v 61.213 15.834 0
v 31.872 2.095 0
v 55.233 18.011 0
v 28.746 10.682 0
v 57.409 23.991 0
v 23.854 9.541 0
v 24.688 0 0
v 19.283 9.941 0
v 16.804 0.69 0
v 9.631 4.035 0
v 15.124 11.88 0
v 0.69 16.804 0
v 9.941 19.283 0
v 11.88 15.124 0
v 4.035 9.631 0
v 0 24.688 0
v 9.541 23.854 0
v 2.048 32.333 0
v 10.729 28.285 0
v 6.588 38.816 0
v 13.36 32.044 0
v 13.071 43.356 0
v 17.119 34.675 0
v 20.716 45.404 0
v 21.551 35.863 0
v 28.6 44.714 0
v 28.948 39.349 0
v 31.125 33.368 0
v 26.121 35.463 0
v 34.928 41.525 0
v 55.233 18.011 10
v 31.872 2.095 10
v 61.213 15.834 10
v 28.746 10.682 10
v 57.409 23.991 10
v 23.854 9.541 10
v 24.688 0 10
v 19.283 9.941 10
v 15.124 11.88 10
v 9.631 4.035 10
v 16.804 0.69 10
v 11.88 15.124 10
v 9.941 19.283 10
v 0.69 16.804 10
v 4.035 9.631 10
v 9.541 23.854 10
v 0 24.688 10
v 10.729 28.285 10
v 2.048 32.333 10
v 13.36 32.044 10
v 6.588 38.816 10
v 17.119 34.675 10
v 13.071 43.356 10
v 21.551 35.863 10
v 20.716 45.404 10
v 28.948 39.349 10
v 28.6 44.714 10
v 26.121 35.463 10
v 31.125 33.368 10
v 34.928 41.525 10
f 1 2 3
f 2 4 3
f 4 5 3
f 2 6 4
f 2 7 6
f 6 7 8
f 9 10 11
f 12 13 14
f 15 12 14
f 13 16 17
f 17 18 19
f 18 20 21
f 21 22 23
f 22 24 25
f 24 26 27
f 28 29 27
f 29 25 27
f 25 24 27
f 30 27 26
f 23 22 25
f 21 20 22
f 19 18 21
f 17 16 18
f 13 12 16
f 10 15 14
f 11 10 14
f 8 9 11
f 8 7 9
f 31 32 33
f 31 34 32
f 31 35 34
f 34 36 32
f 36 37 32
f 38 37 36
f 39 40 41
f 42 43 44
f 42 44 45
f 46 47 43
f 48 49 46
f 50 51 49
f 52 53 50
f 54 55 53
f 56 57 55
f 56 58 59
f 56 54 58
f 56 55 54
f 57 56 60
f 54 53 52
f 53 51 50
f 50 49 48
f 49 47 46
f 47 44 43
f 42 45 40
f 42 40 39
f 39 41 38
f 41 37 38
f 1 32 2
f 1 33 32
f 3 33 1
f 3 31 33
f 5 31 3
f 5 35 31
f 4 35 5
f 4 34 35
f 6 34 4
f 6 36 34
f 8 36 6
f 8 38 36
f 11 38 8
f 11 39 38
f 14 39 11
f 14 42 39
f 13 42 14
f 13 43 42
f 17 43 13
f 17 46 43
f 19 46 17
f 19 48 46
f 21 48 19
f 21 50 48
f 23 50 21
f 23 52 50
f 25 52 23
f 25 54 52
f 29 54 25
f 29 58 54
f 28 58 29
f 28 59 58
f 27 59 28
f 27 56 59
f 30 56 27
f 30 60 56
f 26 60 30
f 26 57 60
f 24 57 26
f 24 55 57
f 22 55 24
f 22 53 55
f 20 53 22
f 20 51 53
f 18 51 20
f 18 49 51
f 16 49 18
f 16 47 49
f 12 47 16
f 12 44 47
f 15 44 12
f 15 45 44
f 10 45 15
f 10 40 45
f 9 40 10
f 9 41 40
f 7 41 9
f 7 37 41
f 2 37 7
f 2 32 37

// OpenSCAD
$fn = 32;

// ----------------------------------------------------------------------
// Eye lug: ring_tail, 10 mm thick
// ----------------------------------------------------------------------

// --- parameters (mm) ---
profile_height = 10;      // extrusion height
profile_points = 30;      // points of the closed outline

profile = [[28.948, 39.349], [34.928, 41.525], [28.6, 44.714], [20.716, 45.404], [13.071, 43.356], [6.588, 38.816], [2.048, 32.333], [0, 24.688], [0.69, 16.804], [4.035, 9.631], [9.631, 4.035], [16.804, 0.69], [24.688, 0], [31.872, 2.095], [61.213, 15.834], [55.233, 18.011], [57.409, 23.991], [28.746, 10.682], [23.854, 9.541], [19.283, 9.941], [15.124, 11.88], [11.88, 15.124], [9.941, 19.283], [9.541, 23.854], [10.729, 28.285], [13.36, 32.044], [17.119, 34.675], [21.551, 35.863], [26.121, 35.463], [31.125, 33.368]];  // single closed polygon, 30 points, counter clockwise

// --- the one profile operation ---
linear_extrude(height = profile_height) polygon(points = profile);
